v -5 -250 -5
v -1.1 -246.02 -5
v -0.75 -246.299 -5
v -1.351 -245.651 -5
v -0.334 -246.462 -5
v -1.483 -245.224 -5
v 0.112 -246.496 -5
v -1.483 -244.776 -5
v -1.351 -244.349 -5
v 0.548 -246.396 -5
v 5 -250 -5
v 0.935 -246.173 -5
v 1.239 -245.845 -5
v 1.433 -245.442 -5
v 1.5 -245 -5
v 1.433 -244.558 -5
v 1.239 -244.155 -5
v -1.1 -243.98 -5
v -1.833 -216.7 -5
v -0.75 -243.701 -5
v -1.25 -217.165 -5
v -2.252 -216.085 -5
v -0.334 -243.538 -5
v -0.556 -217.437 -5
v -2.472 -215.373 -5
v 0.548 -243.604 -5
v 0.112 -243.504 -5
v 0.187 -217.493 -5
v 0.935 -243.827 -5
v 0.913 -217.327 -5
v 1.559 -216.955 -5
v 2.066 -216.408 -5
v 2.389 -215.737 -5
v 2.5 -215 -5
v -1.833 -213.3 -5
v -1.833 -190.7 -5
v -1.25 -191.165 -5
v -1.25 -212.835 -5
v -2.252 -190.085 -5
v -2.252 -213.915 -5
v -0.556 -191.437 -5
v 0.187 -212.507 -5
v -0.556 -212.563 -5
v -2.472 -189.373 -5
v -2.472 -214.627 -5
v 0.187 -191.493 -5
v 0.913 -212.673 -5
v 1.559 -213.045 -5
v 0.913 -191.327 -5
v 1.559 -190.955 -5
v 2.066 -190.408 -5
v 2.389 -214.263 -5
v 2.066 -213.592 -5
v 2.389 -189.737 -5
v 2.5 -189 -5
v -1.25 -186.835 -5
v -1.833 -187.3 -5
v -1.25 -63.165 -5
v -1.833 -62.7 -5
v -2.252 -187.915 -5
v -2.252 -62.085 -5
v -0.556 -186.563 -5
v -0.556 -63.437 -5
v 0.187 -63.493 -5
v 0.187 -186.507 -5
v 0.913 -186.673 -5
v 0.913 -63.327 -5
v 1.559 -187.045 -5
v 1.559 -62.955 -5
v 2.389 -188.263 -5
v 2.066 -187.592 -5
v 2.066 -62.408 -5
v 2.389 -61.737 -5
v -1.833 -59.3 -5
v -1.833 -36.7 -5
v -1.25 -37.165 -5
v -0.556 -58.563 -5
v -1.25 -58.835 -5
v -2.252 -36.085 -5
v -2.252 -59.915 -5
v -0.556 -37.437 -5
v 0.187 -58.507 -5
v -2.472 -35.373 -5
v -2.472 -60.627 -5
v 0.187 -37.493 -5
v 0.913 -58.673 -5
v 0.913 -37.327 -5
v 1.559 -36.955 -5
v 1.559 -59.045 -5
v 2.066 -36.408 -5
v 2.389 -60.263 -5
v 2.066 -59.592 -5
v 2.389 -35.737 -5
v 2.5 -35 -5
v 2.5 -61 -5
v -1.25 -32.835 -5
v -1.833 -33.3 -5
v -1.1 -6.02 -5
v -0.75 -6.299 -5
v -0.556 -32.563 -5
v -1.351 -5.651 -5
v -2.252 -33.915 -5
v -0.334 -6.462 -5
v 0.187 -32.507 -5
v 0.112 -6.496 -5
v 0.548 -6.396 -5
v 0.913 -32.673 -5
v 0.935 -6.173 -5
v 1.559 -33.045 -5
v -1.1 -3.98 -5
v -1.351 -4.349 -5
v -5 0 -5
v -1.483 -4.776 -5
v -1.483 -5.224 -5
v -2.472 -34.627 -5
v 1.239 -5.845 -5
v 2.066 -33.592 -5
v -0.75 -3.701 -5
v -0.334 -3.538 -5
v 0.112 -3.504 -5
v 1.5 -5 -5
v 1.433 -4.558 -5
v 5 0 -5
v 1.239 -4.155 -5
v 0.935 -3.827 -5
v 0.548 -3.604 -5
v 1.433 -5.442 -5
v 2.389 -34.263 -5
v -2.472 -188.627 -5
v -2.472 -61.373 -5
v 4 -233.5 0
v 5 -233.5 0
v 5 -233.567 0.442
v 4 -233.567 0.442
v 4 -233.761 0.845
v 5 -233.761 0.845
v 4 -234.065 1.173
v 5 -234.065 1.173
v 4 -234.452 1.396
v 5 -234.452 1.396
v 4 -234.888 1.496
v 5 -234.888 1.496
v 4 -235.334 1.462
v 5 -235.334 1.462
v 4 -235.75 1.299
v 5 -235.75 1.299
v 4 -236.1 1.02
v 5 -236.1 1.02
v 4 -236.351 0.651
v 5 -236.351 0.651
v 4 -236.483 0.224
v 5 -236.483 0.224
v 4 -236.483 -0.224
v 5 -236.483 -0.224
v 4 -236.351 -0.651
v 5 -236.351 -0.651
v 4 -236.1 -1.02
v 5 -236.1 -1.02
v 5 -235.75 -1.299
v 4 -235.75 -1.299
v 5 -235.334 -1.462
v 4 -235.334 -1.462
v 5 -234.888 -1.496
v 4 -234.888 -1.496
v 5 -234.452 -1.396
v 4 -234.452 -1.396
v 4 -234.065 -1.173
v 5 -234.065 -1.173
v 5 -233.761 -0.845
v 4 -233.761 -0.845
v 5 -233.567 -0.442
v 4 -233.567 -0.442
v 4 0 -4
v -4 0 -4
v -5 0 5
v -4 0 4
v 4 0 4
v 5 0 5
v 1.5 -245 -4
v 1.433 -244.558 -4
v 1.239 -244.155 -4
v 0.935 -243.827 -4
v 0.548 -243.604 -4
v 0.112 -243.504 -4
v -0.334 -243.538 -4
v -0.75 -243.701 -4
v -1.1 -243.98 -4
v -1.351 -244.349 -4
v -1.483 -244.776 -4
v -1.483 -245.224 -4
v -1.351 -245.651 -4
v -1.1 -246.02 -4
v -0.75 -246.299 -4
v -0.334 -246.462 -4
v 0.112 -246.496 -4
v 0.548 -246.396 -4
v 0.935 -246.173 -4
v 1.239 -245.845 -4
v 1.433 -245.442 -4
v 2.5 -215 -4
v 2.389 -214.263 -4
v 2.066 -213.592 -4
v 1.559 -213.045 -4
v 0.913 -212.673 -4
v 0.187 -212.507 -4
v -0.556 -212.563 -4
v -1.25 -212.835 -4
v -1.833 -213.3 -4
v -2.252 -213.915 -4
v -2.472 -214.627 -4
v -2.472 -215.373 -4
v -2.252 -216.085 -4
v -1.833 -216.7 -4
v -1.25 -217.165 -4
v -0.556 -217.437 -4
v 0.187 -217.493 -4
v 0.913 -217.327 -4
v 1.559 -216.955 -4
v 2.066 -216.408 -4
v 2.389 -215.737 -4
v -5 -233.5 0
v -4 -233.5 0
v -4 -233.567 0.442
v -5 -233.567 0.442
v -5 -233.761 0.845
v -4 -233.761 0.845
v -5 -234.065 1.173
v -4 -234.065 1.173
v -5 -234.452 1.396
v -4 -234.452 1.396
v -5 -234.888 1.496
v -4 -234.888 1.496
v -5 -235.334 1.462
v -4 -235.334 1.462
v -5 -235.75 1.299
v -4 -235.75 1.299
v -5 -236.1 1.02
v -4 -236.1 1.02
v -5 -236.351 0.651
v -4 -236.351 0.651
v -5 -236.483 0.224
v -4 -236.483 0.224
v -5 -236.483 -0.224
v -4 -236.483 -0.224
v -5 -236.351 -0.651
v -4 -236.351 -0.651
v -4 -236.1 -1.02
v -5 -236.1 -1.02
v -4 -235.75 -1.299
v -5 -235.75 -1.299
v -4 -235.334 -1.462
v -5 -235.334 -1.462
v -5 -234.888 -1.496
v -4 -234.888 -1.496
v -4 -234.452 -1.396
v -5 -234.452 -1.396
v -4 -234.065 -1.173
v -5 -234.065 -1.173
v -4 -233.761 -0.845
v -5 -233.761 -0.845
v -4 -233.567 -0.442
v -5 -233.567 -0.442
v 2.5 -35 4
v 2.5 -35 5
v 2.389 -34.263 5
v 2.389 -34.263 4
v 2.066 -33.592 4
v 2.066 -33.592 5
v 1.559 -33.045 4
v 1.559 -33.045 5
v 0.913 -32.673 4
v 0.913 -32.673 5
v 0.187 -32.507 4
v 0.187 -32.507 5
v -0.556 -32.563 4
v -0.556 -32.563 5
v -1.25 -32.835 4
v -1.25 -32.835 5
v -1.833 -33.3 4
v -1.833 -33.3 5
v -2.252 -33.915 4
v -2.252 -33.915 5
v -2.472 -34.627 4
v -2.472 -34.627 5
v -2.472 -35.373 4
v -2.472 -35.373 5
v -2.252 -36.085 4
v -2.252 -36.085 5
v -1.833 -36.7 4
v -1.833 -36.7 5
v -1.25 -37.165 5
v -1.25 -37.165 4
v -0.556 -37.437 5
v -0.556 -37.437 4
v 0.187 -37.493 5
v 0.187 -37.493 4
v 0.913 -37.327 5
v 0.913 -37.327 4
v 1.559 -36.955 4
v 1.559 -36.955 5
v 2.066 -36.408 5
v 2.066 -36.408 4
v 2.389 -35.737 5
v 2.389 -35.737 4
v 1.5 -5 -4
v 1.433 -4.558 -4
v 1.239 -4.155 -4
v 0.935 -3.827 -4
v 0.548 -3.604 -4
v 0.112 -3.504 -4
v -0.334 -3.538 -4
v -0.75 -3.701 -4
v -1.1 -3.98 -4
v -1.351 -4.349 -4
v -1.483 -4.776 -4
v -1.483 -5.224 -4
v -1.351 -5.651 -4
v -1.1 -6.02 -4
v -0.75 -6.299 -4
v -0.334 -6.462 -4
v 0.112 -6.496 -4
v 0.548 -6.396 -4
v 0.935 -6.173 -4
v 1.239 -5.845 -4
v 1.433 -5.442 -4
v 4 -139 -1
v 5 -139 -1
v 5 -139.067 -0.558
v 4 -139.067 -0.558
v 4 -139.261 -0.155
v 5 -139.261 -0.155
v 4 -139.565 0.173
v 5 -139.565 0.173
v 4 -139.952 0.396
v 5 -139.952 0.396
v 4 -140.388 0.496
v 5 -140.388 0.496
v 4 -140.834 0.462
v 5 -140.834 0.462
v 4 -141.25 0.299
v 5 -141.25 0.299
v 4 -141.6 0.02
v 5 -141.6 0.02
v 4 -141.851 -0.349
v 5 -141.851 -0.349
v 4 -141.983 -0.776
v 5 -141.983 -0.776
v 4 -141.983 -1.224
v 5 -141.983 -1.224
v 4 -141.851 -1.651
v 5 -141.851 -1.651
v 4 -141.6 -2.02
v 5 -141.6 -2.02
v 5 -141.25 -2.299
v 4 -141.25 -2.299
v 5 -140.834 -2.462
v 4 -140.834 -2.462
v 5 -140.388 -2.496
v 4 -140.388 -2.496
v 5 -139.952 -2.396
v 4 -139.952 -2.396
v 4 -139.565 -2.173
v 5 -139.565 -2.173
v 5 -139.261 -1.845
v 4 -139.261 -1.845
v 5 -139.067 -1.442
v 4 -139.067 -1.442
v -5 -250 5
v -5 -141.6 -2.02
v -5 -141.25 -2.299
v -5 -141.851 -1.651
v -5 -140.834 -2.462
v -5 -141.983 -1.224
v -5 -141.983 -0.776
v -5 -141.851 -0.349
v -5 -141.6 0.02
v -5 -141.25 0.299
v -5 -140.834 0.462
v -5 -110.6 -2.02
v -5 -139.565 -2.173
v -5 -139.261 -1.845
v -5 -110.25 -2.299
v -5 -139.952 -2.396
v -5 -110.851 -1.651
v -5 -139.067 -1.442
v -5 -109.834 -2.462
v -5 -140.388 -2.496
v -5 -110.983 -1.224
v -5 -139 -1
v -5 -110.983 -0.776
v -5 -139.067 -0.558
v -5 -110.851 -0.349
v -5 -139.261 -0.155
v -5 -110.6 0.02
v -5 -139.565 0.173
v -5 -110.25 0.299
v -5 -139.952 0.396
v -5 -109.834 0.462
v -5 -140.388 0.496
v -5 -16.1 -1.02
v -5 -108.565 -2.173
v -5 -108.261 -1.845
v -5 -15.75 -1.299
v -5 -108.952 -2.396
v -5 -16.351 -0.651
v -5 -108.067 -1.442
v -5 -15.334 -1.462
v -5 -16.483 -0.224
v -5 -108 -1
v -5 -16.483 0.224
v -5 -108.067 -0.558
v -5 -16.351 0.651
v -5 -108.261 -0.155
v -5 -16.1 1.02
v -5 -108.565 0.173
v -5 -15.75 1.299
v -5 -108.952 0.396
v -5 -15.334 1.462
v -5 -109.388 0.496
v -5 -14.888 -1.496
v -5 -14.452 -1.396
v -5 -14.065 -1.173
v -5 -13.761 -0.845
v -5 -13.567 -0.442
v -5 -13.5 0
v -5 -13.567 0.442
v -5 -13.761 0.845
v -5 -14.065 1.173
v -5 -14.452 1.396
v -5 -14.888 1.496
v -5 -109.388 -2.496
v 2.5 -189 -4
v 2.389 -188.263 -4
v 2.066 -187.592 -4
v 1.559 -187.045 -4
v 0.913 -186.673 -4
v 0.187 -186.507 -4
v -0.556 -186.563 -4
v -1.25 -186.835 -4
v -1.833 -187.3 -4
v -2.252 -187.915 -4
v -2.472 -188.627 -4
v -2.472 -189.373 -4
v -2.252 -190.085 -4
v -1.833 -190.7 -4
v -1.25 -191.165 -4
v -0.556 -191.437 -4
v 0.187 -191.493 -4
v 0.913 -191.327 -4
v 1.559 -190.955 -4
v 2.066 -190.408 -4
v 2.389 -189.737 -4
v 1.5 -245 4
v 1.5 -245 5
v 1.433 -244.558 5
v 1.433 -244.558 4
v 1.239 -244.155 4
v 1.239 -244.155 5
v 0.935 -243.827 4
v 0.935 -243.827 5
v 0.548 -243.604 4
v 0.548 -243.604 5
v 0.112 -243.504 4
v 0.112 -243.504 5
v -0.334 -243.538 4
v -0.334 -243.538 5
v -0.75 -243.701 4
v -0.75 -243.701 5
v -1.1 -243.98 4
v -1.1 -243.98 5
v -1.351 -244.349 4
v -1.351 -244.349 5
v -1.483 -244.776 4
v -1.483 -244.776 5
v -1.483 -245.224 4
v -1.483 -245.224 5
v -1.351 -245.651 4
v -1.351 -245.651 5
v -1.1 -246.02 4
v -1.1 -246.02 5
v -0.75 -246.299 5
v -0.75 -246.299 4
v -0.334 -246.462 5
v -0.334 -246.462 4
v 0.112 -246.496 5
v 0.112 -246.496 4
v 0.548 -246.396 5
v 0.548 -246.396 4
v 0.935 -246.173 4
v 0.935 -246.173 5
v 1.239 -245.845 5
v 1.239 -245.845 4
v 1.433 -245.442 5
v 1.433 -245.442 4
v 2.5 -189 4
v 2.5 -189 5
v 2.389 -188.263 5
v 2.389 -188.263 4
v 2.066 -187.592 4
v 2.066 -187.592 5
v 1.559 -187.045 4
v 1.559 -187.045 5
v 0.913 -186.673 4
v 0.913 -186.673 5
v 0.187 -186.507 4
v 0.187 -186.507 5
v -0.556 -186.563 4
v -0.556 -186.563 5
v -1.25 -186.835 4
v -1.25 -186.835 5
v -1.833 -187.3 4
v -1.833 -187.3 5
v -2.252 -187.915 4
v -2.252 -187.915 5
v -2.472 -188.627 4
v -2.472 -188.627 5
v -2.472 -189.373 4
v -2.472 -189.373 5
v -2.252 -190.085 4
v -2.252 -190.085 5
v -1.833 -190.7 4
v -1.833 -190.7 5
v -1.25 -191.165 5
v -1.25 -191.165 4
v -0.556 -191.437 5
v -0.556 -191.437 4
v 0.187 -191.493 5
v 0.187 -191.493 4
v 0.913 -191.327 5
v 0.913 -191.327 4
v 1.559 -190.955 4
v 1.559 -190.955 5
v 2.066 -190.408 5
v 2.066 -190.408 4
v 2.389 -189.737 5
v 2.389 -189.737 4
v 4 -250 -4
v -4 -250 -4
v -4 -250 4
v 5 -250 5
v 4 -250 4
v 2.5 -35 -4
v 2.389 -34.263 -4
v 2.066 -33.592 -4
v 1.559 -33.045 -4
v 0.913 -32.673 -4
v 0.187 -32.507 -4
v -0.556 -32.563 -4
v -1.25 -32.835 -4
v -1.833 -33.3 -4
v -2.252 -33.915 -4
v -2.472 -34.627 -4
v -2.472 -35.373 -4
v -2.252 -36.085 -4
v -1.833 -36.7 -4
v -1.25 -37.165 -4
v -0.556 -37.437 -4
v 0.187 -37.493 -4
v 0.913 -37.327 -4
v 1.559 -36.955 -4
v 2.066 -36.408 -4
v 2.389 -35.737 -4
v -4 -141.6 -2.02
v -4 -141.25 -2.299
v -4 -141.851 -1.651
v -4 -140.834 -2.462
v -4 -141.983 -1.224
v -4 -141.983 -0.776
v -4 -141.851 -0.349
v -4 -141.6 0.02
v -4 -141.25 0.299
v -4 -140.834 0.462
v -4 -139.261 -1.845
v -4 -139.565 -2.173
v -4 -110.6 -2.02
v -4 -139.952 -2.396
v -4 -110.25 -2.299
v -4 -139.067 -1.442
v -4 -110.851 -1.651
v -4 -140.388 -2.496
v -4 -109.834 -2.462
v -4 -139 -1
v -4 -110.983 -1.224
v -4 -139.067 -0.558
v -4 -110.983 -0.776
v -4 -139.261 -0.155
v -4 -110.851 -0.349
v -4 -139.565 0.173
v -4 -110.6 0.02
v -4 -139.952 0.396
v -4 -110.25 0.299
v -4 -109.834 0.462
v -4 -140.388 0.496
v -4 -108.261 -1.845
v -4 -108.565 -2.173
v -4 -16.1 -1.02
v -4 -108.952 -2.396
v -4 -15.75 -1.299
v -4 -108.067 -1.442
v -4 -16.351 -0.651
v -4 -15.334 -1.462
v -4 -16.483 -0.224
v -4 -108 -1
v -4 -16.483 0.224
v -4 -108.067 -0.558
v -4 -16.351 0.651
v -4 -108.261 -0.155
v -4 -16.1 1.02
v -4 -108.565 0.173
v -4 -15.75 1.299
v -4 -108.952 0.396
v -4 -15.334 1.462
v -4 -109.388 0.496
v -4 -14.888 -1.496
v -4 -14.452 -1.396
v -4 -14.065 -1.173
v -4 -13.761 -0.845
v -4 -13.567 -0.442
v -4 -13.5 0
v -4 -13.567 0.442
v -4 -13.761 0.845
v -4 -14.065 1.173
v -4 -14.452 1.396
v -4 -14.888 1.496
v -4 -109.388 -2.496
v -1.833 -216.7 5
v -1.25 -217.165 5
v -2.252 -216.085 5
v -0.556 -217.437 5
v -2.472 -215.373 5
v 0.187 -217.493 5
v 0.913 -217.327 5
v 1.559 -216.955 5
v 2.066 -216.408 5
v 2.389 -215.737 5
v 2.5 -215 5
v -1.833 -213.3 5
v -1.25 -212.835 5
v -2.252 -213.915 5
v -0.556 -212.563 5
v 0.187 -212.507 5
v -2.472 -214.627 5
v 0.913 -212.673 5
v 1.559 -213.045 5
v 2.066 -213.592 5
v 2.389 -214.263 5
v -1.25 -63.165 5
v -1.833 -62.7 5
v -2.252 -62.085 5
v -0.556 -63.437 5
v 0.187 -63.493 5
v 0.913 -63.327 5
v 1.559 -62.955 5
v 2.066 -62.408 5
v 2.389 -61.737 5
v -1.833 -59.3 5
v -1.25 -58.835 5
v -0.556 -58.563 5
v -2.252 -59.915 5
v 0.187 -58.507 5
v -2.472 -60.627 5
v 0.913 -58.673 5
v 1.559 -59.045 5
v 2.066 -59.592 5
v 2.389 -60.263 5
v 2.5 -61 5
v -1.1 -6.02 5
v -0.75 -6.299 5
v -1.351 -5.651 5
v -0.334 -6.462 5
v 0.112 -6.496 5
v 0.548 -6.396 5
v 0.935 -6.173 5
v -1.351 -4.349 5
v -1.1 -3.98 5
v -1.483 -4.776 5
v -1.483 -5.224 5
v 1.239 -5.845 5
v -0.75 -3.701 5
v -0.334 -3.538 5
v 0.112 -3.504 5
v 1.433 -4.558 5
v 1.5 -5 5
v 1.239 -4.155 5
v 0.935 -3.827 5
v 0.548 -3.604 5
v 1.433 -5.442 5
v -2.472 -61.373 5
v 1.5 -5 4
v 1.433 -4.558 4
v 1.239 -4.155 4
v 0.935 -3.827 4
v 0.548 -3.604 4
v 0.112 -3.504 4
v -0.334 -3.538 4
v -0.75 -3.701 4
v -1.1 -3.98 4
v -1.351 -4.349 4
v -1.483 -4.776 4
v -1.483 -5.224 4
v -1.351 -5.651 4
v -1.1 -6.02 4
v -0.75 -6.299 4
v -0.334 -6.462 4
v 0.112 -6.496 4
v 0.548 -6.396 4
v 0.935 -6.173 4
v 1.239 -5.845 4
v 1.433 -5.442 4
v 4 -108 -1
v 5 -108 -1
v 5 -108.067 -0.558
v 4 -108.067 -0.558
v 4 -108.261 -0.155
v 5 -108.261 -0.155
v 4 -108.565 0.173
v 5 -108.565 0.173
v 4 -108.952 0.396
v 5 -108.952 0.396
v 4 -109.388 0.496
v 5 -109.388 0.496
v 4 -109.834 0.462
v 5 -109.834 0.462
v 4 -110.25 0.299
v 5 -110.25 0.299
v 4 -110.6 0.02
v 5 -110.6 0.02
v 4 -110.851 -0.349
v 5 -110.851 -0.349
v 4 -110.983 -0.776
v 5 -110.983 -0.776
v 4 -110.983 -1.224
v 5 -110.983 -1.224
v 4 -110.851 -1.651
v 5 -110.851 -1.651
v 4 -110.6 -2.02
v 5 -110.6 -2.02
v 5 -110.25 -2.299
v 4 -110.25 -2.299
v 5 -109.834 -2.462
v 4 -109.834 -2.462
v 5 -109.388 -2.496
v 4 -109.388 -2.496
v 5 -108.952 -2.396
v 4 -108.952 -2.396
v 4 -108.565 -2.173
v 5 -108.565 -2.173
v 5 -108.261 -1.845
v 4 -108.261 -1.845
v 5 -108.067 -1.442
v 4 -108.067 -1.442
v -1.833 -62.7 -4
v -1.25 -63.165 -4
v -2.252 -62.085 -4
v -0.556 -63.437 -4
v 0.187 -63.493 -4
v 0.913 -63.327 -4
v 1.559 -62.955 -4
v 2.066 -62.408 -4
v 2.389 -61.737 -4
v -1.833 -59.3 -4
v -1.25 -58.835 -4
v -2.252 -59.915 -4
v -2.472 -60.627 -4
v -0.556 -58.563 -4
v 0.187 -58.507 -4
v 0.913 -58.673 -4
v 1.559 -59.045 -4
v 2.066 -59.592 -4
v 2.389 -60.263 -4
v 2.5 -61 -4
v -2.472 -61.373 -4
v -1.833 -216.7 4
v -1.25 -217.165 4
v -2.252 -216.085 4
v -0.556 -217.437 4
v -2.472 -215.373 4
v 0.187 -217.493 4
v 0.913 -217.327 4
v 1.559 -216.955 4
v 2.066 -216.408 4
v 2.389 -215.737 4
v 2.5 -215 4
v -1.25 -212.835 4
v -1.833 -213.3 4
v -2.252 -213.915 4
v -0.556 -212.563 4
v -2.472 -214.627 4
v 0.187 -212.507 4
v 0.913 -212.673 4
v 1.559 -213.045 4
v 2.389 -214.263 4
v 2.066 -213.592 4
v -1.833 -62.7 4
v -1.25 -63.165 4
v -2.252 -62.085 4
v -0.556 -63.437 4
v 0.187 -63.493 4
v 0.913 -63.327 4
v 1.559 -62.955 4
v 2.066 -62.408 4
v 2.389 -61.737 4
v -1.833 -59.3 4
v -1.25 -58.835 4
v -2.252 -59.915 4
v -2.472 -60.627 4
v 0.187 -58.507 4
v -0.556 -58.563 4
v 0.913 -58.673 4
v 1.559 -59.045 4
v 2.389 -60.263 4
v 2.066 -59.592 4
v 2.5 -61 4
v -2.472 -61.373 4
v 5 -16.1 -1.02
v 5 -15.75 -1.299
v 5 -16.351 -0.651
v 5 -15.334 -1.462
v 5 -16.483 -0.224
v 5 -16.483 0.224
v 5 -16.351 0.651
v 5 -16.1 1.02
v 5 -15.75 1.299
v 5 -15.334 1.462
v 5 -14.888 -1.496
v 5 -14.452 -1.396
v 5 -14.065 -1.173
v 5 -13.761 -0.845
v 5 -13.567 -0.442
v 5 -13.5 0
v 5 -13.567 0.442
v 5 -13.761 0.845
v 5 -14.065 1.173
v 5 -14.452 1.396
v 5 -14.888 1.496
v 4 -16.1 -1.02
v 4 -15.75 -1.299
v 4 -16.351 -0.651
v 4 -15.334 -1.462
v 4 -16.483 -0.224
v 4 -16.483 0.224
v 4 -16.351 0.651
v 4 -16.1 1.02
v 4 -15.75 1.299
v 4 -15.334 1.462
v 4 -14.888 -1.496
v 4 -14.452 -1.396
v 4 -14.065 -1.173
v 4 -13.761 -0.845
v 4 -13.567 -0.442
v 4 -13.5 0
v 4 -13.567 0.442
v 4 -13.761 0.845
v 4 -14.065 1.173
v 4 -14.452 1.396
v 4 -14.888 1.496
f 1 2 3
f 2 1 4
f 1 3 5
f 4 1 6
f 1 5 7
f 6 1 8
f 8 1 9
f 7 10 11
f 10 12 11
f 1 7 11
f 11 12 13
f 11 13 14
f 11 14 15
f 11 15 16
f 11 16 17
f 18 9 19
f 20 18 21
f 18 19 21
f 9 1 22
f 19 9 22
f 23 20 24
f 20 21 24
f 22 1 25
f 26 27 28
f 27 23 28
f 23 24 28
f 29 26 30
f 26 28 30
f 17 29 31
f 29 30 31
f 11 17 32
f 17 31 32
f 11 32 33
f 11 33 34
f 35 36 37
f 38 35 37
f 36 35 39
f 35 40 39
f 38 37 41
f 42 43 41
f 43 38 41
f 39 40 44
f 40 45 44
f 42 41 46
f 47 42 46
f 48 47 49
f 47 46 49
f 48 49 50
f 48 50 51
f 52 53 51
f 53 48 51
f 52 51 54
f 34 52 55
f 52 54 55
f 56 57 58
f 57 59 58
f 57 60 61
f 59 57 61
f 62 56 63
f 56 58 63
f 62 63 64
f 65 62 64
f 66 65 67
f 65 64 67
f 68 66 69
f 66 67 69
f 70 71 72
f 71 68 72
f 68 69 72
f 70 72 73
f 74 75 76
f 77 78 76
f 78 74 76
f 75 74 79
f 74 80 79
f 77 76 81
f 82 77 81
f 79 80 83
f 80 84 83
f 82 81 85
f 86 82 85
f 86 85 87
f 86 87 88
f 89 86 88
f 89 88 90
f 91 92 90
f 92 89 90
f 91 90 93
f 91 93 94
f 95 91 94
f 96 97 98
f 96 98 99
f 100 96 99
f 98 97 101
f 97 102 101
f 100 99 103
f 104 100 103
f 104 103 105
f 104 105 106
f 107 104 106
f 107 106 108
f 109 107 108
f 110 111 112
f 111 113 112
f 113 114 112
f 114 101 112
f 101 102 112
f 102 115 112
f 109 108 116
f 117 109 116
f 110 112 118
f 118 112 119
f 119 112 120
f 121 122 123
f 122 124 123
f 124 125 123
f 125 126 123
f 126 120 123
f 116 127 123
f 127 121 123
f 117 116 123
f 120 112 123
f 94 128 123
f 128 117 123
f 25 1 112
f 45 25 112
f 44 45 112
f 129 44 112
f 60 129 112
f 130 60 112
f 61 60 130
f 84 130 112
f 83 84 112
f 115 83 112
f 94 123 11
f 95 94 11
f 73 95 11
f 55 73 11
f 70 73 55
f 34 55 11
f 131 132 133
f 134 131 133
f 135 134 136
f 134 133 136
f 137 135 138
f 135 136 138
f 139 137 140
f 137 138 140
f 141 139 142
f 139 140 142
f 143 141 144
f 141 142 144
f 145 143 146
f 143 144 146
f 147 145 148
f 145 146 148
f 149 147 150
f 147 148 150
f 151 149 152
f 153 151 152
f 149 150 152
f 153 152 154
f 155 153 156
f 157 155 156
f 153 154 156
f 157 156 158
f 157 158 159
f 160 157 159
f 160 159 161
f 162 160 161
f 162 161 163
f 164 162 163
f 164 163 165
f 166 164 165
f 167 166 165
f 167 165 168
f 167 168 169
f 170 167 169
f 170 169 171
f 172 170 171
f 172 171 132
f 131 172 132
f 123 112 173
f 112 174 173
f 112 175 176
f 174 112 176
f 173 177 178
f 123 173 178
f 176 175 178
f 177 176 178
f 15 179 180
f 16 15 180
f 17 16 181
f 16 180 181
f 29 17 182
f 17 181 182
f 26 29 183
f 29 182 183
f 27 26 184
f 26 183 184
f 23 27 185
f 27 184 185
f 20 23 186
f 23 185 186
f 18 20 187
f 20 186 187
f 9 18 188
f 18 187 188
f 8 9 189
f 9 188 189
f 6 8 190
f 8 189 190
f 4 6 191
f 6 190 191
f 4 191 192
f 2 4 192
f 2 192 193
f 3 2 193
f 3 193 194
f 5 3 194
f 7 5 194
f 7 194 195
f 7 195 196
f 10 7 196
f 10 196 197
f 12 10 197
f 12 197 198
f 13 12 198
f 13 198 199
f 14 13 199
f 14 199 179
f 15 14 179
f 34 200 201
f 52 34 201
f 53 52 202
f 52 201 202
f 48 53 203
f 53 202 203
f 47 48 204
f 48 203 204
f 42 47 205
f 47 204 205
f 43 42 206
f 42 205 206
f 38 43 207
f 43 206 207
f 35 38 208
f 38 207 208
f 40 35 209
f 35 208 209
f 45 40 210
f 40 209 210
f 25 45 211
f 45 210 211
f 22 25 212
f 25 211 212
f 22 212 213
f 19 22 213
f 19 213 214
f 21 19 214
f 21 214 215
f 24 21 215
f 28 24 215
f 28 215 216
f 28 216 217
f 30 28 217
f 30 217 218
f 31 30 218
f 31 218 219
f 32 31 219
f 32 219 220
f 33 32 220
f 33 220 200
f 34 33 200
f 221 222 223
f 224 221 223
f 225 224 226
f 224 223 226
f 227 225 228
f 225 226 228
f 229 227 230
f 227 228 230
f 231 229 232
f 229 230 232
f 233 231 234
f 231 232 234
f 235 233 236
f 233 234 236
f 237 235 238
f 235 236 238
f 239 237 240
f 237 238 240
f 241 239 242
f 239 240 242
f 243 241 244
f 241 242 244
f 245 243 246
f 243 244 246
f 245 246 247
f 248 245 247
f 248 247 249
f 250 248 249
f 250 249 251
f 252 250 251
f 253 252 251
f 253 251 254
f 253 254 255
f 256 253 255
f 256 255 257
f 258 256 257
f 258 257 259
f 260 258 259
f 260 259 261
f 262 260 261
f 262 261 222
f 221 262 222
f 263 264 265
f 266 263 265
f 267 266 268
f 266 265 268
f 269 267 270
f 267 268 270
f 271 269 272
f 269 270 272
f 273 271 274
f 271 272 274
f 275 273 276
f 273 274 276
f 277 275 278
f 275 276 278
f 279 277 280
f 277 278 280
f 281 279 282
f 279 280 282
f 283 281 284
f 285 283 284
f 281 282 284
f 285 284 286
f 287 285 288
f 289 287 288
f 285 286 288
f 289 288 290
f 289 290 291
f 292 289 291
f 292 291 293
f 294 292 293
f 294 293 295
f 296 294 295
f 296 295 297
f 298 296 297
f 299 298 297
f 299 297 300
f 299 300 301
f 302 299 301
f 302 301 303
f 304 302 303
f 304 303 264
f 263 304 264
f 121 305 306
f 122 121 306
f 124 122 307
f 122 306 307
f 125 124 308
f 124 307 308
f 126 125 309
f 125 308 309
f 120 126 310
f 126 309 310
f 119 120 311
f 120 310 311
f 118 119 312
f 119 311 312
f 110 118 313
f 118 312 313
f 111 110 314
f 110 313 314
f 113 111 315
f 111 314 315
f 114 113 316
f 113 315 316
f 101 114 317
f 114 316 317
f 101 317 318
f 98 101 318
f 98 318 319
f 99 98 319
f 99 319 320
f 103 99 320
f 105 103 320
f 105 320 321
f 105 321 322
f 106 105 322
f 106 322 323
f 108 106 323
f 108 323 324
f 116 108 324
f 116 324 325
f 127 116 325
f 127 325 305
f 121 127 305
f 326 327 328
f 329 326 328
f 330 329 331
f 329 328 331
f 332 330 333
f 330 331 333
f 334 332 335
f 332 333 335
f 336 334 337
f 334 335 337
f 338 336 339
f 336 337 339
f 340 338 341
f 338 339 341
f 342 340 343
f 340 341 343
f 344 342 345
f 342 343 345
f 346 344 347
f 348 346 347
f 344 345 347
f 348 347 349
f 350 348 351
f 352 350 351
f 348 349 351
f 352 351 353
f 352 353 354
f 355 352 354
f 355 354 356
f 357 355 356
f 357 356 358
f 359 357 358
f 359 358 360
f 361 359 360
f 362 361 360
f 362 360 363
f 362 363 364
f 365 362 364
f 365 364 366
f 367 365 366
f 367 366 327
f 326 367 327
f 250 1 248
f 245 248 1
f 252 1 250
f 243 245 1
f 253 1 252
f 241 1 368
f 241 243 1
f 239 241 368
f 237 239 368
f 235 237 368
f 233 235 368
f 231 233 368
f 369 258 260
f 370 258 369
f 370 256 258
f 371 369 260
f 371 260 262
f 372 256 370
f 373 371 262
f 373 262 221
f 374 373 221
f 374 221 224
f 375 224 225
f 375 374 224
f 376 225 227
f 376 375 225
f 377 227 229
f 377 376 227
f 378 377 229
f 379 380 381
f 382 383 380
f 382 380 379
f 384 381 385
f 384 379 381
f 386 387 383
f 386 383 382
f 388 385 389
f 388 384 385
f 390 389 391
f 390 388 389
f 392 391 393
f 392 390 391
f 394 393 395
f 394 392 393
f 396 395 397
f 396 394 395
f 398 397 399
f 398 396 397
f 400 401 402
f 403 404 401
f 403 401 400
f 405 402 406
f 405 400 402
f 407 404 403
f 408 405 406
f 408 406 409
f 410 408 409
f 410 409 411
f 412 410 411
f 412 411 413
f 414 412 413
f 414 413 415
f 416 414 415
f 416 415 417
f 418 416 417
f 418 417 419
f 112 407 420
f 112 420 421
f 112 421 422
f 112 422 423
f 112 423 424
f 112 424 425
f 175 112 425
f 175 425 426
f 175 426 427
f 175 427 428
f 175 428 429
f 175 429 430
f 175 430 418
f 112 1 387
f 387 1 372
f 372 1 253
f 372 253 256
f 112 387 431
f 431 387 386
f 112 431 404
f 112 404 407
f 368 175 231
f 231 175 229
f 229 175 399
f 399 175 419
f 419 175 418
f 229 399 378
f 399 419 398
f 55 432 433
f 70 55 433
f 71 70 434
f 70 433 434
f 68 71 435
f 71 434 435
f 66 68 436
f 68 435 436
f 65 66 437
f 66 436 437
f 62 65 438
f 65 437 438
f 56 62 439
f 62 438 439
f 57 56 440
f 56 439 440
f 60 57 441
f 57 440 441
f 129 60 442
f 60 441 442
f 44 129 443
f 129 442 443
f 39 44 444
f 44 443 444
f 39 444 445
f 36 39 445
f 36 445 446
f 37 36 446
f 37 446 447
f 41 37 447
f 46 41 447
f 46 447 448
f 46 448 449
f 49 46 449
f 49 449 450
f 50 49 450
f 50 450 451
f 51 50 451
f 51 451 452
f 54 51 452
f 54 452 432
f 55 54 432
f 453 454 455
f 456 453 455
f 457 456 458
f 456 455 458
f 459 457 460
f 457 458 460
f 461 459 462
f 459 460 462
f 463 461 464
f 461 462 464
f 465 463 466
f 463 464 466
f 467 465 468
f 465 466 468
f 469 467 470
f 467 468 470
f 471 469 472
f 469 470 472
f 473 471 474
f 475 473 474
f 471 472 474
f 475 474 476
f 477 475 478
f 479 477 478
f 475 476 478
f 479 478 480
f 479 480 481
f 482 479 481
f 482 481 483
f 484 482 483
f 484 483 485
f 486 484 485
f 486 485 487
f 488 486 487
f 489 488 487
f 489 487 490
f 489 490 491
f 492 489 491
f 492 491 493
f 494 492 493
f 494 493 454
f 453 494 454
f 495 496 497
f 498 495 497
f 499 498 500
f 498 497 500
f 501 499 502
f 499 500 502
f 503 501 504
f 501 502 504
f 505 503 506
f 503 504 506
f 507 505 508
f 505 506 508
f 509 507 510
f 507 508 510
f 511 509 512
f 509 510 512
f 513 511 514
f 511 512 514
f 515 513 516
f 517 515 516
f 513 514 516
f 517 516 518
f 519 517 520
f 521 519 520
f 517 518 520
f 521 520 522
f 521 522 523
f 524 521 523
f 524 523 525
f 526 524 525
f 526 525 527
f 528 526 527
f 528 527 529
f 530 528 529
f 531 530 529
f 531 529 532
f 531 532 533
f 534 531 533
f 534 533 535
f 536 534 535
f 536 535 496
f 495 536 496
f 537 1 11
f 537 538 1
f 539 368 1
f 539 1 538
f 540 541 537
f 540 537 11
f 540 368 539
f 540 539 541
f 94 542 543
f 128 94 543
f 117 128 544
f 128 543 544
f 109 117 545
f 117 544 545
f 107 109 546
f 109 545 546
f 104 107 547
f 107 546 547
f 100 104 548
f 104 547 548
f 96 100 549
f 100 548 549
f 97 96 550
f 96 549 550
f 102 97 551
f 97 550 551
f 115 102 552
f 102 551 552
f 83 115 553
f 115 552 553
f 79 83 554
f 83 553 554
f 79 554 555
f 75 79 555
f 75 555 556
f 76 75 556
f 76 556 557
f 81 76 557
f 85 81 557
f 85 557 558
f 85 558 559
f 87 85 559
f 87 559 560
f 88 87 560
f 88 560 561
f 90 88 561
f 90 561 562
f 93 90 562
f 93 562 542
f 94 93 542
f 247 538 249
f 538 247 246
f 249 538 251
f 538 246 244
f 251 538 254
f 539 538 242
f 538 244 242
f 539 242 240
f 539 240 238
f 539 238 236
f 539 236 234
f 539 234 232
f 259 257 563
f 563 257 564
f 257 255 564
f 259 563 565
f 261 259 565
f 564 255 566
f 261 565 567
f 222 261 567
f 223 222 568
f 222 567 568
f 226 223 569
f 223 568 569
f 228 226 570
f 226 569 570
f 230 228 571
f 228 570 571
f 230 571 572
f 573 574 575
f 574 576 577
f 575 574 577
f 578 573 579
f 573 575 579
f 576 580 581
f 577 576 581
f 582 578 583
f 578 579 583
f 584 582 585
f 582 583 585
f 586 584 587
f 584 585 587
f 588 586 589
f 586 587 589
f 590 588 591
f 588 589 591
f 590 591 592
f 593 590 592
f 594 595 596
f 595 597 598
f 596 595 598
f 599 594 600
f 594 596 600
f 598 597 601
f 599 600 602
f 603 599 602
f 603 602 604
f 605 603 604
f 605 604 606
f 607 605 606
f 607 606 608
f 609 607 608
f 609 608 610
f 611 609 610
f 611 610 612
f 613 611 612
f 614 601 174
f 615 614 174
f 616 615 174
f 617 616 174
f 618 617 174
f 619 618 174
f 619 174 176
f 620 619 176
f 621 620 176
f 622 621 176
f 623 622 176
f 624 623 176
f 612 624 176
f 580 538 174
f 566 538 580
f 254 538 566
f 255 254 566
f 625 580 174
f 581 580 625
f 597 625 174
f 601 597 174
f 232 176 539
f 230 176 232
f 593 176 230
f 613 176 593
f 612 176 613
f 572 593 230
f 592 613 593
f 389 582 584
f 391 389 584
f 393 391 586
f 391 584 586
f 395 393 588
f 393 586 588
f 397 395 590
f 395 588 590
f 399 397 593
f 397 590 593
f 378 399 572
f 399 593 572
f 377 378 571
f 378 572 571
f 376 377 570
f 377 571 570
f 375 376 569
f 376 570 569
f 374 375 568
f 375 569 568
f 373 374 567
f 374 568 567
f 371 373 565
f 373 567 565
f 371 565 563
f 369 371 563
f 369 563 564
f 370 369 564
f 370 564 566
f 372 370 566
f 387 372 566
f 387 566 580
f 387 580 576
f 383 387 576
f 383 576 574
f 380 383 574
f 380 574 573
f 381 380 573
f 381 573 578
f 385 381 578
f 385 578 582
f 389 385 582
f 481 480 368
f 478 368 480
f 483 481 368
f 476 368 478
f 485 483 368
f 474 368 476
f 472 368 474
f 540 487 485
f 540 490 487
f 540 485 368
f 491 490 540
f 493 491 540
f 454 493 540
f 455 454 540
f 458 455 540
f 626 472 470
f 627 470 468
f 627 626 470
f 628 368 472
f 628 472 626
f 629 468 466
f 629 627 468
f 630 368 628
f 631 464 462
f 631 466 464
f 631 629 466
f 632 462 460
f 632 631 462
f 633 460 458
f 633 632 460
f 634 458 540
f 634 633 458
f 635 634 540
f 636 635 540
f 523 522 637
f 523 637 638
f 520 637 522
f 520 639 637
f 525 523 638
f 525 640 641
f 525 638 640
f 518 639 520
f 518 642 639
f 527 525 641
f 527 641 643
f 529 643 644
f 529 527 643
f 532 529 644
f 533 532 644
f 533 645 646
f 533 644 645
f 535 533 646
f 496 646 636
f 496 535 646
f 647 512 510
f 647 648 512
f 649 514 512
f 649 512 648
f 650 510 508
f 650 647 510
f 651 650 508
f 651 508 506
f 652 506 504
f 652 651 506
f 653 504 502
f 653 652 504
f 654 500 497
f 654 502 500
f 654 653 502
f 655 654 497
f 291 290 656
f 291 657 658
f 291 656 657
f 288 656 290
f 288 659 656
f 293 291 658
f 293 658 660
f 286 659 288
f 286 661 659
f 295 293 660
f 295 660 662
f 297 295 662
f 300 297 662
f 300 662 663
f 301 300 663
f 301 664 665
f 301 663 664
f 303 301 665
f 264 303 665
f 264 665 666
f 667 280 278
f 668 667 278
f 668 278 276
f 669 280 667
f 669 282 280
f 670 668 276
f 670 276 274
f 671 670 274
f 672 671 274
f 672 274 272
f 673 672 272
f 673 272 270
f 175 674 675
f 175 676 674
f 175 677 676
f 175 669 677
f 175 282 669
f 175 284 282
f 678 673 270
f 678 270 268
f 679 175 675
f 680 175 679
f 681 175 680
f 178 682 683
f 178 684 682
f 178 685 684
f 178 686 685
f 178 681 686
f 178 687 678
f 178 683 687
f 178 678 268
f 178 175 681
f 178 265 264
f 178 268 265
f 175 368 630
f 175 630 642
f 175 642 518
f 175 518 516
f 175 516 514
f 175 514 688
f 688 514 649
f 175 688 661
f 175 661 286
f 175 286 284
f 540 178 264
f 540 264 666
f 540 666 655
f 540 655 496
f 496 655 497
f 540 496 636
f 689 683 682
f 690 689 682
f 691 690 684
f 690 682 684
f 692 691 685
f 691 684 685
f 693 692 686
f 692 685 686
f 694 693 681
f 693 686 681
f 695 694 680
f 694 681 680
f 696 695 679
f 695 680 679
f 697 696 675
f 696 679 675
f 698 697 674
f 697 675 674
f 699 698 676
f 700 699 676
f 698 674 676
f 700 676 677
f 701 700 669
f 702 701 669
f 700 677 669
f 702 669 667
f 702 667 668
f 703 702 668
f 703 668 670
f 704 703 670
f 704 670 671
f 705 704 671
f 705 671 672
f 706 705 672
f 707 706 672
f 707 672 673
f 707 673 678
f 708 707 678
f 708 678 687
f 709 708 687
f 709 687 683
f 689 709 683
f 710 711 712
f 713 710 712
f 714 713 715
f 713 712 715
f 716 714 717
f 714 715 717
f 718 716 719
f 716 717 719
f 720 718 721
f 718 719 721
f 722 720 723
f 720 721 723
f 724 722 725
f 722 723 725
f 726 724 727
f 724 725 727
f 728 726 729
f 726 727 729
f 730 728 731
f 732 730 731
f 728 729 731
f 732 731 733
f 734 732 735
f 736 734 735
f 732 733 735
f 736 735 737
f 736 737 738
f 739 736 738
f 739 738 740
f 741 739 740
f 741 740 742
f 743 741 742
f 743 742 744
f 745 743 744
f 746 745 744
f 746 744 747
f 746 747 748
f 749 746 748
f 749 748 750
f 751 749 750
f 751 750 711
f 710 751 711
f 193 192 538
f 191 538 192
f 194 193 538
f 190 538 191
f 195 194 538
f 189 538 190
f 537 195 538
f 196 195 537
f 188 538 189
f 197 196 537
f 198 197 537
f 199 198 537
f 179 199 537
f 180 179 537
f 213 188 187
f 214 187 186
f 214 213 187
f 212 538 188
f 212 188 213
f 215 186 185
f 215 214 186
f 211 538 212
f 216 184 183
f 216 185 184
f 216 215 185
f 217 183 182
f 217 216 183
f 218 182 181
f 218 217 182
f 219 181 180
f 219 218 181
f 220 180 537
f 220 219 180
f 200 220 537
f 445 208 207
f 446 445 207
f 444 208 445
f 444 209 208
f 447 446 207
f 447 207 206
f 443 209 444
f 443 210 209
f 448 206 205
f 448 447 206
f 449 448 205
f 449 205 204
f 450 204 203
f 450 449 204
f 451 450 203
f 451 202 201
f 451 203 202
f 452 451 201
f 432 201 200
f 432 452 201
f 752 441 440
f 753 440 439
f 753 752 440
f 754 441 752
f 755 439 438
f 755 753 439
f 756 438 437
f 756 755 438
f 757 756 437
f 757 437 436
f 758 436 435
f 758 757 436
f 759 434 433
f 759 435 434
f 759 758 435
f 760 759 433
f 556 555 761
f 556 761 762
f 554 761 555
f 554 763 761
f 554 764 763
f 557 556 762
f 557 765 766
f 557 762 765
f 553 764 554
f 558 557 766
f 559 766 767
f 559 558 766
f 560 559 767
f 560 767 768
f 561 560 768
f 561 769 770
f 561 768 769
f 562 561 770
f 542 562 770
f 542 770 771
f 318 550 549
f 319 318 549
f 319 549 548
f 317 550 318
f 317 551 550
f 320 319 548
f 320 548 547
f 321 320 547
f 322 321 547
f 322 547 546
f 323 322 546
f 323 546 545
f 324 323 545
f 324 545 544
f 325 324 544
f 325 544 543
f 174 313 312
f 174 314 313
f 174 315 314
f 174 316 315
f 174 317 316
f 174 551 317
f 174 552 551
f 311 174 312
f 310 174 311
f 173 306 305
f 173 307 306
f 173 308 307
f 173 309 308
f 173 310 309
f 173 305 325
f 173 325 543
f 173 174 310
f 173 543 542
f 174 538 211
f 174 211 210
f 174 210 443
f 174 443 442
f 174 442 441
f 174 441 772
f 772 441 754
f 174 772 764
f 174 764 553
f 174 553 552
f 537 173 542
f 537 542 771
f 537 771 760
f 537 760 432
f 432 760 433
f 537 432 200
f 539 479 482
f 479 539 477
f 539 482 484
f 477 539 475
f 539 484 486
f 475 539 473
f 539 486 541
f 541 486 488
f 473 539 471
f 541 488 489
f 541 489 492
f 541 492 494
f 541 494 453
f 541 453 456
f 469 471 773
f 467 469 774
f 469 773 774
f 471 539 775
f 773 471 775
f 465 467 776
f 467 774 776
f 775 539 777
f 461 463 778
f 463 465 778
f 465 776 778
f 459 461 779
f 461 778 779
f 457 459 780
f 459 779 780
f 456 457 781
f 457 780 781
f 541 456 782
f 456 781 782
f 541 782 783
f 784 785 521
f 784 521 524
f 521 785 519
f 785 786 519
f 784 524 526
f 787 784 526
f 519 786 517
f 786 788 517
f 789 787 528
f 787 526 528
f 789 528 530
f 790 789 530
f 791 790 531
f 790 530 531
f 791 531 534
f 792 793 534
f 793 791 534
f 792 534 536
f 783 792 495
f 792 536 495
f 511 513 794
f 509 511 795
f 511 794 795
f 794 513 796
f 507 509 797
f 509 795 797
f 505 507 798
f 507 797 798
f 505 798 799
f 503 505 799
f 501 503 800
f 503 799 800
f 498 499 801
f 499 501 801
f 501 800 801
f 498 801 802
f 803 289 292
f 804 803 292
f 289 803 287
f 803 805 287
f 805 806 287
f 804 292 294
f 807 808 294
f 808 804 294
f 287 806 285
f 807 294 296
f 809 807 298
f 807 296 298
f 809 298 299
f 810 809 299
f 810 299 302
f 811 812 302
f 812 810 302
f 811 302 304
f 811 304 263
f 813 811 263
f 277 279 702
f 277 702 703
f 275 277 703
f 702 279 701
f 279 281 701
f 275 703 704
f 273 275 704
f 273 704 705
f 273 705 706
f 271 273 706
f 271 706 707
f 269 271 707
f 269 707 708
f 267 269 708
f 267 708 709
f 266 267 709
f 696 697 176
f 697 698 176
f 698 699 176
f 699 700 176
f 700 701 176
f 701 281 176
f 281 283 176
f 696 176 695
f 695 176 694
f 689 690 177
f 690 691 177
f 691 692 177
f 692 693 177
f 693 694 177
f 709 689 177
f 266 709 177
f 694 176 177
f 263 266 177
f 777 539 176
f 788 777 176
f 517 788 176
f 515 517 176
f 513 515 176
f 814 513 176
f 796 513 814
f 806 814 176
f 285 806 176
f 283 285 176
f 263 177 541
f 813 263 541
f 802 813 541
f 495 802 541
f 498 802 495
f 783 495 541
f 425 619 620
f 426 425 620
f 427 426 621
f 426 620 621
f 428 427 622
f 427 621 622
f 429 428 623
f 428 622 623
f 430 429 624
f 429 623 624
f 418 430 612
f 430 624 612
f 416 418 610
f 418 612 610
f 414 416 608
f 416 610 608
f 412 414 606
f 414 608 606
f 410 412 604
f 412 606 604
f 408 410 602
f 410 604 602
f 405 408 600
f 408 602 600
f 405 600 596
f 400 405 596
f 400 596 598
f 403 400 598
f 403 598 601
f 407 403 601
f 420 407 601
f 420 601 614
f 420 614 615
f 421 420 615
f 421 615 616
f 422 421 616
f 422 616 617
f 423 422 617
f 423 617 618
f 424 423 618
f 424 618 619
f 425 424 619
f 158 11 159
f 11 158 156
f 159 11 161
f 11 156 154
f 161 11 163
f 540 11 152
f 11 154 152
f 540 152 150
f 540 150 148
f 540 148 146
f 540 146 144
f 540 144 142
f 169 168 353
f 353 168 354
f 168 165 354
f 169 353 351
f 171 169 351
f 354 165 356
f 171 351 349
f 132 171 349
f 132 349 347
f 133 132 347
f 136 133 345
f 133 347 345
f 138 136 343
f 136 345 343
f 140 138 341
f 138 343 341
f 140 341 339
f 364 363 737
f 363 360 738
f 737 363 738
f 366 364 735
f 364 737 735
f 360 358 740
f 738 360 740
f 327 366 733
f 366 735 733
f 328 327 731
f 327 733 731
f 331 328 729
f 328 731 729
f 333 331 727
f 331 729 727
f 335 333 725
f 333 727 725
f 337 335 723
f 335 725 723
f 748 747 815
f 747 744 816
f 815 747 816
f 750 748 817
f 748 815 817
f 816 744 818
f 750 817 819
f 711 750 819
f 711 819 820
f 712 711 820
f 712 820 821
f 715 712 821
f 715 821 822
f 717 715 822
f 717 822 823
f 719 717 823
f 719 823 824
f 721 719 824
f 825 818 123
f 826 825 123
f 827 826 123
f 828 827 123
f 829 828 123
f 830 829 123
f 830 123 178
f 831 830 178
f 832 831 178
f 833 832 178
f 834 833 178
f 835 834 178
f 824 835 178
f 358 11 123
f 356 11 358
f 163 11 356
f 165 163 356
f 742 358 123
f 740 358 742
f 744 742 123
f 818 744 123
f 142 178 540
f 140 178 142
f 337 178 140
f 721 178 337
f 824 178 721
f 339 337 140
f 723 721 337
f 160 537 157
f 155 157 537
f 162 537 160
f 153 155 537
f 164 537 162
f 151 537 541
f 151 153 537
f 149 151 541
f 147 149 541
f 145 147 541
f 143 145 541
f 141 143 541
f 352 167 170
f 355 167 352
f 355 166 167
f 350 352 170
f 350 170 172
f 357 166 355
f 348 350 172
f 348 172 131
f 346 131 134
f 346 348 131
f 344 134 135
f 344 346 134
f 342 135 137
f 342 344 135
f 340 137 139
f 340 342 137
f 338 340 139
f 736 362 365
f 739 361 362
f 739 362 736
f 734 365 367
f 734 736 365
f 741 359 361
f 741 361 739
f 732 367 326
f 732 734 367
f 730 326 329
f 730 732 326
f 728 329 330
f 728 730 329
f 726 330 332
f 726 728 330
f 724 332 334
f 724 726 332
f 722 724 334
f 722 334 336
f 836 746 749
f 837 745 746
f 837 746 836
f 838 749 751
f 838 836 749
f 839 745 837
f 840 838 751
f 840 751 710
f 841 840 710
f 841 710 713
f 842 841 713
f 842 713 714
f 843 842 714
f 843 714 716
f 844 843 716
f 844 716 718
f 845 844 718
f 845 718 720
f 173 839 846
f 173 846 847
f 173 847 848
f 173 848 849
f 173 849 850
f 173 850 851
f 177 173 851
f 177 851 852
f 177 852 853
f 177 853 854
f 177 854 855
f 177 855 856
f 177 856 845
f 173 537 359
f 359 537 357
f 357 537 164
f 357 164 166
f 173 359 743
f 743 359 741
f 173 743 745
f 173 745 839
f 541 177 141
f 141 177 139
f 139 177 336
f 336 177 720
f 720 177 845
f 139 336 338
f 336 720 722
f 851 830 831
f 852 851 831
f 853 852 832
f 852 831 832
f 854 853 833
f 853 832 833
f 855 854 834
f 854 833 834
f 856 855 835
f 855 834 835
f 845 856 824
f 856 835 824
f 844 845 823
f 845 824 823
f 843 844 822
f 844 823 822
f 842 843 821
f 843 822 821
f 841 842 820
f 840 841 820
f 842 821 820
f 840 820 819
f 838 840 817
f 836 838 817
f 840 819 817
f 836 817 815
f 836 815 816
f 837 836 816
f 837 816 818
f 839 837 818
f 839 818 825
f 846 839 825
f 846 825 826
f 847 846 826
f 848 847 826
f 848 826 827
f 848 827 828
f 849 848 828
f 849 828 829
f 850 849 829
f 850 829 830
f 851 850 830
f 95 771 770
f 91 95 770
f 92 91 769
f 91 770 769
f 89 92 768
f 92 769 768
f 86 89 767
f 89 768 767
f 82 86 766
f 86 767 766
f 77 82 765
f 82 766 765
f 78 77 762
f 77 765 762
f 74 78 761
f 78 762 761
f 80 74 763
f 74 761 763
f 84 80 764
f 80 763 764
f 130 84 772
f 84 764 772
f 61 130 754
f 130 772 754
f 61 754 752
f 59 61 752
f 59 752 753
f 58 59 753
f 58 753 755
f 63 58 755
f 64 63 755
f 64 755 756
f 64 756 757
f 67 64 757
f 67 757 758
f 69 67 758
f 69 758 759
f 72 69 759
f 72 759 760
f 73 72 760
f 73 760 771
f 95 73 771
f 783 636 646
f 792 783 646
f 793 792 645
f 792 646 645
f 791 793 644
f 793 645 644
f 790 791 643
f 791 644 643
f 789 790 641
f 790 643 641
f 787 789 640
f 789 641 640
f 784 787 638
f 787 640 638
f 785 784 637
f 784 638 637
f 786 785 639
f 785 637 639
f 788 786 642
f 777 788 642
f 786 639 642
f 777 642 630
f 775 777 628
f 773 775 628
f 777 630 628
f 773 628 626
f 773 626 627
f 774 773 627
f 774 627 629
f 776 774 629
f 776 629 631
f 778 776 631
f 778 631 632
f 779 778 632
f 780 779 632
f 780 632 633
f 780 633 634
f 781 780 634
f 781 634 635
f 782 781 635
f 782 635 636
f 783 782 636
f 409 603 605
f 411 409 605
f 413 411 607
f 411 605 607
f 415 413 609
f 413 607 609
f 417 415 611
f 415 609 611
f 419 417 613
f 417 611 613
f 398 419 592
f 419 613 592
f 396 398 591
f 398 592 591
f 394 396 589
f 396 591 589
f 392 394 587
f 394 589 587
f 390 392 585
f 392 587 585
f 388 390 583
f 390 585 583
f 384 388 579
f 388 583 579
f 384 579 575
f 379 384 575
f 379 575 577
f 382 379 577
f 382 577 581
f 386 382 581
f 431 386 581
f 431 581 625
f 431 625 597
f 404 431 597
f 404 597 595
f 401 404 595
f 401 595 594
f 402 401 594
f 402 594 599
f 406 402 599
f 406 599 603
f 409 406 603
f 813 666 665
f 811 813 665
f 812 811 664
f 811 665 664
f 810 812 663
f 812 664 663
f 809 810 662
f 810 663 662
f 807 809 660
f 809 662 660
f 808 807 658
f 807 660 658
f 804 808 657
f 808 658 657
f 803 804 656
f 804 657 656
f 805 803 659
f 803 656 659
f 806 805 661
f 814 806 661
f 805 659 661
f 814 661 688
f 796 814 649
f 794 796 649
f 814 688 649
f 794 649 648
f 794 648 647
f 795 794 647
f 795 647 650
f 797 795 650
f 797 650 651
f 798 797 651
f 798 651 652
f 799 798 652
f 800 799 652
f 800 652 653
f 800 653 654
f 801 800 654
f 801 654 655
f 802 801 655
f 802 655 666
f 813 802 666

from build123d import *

# Parameters (mm, degrees)
F0_W     = 10
F0_H     = 10
F0_W_2   = 8
F0_H_2   = 8
F1_DEPTH = 250
F2_R     = 1.5
F4_DEPTH = 25
F3_R     = 1.5
F3_R_2   = 2.5
F5_DEPTH = 25


with BuildPart() as f1:
    # F0 (on Front) → F1 (new body)
    with BuildSketch(Plane.XZ):
        Rectangle(F0_W, F0_H)
        Rectangle(F0_W_2, F0_H_2, mode=Mode.SUBTRACT)
    extrude(amount=F1_DEPTH)

    # F2 (on face) → F4 (cut)
    with BuildSketch(Plane.YZ.offset(5)):
        with Locations((-140.5, -1)):
            Circle(F2_R)
        with Locations((-109.5, -1)):
            Circle(F2_R)
        with Locations((-235, 0)):
            Circle(F2_R)
        with Locations((-15, 0)):
            Circle(F2_R)
    extrude(amount=-F4_DEPTH, mode=Mode.SUBTRACT)

    # F3 (on face) → F5 (cut)
    with BuildSketch(Plane.XY.offset(5)):
        with Locations((0, -245)):
            Circle(F3_R)
        with Locations((0, -5)):
            Circle(F3_R)
        with Locations((0, -215)):
            Circle(F3_R_2)
        with Locations((0, -189)):
            Circle(F3_R_2)
        with Locations((0, -61)):
            Circle(F3_R_2)
        with Locations((0, -35)):
            Circle(F3_R_2)
    extrude(amount=-F5_DEPTH, mode=Mode.SUBTRACT)


solid = f1.part
